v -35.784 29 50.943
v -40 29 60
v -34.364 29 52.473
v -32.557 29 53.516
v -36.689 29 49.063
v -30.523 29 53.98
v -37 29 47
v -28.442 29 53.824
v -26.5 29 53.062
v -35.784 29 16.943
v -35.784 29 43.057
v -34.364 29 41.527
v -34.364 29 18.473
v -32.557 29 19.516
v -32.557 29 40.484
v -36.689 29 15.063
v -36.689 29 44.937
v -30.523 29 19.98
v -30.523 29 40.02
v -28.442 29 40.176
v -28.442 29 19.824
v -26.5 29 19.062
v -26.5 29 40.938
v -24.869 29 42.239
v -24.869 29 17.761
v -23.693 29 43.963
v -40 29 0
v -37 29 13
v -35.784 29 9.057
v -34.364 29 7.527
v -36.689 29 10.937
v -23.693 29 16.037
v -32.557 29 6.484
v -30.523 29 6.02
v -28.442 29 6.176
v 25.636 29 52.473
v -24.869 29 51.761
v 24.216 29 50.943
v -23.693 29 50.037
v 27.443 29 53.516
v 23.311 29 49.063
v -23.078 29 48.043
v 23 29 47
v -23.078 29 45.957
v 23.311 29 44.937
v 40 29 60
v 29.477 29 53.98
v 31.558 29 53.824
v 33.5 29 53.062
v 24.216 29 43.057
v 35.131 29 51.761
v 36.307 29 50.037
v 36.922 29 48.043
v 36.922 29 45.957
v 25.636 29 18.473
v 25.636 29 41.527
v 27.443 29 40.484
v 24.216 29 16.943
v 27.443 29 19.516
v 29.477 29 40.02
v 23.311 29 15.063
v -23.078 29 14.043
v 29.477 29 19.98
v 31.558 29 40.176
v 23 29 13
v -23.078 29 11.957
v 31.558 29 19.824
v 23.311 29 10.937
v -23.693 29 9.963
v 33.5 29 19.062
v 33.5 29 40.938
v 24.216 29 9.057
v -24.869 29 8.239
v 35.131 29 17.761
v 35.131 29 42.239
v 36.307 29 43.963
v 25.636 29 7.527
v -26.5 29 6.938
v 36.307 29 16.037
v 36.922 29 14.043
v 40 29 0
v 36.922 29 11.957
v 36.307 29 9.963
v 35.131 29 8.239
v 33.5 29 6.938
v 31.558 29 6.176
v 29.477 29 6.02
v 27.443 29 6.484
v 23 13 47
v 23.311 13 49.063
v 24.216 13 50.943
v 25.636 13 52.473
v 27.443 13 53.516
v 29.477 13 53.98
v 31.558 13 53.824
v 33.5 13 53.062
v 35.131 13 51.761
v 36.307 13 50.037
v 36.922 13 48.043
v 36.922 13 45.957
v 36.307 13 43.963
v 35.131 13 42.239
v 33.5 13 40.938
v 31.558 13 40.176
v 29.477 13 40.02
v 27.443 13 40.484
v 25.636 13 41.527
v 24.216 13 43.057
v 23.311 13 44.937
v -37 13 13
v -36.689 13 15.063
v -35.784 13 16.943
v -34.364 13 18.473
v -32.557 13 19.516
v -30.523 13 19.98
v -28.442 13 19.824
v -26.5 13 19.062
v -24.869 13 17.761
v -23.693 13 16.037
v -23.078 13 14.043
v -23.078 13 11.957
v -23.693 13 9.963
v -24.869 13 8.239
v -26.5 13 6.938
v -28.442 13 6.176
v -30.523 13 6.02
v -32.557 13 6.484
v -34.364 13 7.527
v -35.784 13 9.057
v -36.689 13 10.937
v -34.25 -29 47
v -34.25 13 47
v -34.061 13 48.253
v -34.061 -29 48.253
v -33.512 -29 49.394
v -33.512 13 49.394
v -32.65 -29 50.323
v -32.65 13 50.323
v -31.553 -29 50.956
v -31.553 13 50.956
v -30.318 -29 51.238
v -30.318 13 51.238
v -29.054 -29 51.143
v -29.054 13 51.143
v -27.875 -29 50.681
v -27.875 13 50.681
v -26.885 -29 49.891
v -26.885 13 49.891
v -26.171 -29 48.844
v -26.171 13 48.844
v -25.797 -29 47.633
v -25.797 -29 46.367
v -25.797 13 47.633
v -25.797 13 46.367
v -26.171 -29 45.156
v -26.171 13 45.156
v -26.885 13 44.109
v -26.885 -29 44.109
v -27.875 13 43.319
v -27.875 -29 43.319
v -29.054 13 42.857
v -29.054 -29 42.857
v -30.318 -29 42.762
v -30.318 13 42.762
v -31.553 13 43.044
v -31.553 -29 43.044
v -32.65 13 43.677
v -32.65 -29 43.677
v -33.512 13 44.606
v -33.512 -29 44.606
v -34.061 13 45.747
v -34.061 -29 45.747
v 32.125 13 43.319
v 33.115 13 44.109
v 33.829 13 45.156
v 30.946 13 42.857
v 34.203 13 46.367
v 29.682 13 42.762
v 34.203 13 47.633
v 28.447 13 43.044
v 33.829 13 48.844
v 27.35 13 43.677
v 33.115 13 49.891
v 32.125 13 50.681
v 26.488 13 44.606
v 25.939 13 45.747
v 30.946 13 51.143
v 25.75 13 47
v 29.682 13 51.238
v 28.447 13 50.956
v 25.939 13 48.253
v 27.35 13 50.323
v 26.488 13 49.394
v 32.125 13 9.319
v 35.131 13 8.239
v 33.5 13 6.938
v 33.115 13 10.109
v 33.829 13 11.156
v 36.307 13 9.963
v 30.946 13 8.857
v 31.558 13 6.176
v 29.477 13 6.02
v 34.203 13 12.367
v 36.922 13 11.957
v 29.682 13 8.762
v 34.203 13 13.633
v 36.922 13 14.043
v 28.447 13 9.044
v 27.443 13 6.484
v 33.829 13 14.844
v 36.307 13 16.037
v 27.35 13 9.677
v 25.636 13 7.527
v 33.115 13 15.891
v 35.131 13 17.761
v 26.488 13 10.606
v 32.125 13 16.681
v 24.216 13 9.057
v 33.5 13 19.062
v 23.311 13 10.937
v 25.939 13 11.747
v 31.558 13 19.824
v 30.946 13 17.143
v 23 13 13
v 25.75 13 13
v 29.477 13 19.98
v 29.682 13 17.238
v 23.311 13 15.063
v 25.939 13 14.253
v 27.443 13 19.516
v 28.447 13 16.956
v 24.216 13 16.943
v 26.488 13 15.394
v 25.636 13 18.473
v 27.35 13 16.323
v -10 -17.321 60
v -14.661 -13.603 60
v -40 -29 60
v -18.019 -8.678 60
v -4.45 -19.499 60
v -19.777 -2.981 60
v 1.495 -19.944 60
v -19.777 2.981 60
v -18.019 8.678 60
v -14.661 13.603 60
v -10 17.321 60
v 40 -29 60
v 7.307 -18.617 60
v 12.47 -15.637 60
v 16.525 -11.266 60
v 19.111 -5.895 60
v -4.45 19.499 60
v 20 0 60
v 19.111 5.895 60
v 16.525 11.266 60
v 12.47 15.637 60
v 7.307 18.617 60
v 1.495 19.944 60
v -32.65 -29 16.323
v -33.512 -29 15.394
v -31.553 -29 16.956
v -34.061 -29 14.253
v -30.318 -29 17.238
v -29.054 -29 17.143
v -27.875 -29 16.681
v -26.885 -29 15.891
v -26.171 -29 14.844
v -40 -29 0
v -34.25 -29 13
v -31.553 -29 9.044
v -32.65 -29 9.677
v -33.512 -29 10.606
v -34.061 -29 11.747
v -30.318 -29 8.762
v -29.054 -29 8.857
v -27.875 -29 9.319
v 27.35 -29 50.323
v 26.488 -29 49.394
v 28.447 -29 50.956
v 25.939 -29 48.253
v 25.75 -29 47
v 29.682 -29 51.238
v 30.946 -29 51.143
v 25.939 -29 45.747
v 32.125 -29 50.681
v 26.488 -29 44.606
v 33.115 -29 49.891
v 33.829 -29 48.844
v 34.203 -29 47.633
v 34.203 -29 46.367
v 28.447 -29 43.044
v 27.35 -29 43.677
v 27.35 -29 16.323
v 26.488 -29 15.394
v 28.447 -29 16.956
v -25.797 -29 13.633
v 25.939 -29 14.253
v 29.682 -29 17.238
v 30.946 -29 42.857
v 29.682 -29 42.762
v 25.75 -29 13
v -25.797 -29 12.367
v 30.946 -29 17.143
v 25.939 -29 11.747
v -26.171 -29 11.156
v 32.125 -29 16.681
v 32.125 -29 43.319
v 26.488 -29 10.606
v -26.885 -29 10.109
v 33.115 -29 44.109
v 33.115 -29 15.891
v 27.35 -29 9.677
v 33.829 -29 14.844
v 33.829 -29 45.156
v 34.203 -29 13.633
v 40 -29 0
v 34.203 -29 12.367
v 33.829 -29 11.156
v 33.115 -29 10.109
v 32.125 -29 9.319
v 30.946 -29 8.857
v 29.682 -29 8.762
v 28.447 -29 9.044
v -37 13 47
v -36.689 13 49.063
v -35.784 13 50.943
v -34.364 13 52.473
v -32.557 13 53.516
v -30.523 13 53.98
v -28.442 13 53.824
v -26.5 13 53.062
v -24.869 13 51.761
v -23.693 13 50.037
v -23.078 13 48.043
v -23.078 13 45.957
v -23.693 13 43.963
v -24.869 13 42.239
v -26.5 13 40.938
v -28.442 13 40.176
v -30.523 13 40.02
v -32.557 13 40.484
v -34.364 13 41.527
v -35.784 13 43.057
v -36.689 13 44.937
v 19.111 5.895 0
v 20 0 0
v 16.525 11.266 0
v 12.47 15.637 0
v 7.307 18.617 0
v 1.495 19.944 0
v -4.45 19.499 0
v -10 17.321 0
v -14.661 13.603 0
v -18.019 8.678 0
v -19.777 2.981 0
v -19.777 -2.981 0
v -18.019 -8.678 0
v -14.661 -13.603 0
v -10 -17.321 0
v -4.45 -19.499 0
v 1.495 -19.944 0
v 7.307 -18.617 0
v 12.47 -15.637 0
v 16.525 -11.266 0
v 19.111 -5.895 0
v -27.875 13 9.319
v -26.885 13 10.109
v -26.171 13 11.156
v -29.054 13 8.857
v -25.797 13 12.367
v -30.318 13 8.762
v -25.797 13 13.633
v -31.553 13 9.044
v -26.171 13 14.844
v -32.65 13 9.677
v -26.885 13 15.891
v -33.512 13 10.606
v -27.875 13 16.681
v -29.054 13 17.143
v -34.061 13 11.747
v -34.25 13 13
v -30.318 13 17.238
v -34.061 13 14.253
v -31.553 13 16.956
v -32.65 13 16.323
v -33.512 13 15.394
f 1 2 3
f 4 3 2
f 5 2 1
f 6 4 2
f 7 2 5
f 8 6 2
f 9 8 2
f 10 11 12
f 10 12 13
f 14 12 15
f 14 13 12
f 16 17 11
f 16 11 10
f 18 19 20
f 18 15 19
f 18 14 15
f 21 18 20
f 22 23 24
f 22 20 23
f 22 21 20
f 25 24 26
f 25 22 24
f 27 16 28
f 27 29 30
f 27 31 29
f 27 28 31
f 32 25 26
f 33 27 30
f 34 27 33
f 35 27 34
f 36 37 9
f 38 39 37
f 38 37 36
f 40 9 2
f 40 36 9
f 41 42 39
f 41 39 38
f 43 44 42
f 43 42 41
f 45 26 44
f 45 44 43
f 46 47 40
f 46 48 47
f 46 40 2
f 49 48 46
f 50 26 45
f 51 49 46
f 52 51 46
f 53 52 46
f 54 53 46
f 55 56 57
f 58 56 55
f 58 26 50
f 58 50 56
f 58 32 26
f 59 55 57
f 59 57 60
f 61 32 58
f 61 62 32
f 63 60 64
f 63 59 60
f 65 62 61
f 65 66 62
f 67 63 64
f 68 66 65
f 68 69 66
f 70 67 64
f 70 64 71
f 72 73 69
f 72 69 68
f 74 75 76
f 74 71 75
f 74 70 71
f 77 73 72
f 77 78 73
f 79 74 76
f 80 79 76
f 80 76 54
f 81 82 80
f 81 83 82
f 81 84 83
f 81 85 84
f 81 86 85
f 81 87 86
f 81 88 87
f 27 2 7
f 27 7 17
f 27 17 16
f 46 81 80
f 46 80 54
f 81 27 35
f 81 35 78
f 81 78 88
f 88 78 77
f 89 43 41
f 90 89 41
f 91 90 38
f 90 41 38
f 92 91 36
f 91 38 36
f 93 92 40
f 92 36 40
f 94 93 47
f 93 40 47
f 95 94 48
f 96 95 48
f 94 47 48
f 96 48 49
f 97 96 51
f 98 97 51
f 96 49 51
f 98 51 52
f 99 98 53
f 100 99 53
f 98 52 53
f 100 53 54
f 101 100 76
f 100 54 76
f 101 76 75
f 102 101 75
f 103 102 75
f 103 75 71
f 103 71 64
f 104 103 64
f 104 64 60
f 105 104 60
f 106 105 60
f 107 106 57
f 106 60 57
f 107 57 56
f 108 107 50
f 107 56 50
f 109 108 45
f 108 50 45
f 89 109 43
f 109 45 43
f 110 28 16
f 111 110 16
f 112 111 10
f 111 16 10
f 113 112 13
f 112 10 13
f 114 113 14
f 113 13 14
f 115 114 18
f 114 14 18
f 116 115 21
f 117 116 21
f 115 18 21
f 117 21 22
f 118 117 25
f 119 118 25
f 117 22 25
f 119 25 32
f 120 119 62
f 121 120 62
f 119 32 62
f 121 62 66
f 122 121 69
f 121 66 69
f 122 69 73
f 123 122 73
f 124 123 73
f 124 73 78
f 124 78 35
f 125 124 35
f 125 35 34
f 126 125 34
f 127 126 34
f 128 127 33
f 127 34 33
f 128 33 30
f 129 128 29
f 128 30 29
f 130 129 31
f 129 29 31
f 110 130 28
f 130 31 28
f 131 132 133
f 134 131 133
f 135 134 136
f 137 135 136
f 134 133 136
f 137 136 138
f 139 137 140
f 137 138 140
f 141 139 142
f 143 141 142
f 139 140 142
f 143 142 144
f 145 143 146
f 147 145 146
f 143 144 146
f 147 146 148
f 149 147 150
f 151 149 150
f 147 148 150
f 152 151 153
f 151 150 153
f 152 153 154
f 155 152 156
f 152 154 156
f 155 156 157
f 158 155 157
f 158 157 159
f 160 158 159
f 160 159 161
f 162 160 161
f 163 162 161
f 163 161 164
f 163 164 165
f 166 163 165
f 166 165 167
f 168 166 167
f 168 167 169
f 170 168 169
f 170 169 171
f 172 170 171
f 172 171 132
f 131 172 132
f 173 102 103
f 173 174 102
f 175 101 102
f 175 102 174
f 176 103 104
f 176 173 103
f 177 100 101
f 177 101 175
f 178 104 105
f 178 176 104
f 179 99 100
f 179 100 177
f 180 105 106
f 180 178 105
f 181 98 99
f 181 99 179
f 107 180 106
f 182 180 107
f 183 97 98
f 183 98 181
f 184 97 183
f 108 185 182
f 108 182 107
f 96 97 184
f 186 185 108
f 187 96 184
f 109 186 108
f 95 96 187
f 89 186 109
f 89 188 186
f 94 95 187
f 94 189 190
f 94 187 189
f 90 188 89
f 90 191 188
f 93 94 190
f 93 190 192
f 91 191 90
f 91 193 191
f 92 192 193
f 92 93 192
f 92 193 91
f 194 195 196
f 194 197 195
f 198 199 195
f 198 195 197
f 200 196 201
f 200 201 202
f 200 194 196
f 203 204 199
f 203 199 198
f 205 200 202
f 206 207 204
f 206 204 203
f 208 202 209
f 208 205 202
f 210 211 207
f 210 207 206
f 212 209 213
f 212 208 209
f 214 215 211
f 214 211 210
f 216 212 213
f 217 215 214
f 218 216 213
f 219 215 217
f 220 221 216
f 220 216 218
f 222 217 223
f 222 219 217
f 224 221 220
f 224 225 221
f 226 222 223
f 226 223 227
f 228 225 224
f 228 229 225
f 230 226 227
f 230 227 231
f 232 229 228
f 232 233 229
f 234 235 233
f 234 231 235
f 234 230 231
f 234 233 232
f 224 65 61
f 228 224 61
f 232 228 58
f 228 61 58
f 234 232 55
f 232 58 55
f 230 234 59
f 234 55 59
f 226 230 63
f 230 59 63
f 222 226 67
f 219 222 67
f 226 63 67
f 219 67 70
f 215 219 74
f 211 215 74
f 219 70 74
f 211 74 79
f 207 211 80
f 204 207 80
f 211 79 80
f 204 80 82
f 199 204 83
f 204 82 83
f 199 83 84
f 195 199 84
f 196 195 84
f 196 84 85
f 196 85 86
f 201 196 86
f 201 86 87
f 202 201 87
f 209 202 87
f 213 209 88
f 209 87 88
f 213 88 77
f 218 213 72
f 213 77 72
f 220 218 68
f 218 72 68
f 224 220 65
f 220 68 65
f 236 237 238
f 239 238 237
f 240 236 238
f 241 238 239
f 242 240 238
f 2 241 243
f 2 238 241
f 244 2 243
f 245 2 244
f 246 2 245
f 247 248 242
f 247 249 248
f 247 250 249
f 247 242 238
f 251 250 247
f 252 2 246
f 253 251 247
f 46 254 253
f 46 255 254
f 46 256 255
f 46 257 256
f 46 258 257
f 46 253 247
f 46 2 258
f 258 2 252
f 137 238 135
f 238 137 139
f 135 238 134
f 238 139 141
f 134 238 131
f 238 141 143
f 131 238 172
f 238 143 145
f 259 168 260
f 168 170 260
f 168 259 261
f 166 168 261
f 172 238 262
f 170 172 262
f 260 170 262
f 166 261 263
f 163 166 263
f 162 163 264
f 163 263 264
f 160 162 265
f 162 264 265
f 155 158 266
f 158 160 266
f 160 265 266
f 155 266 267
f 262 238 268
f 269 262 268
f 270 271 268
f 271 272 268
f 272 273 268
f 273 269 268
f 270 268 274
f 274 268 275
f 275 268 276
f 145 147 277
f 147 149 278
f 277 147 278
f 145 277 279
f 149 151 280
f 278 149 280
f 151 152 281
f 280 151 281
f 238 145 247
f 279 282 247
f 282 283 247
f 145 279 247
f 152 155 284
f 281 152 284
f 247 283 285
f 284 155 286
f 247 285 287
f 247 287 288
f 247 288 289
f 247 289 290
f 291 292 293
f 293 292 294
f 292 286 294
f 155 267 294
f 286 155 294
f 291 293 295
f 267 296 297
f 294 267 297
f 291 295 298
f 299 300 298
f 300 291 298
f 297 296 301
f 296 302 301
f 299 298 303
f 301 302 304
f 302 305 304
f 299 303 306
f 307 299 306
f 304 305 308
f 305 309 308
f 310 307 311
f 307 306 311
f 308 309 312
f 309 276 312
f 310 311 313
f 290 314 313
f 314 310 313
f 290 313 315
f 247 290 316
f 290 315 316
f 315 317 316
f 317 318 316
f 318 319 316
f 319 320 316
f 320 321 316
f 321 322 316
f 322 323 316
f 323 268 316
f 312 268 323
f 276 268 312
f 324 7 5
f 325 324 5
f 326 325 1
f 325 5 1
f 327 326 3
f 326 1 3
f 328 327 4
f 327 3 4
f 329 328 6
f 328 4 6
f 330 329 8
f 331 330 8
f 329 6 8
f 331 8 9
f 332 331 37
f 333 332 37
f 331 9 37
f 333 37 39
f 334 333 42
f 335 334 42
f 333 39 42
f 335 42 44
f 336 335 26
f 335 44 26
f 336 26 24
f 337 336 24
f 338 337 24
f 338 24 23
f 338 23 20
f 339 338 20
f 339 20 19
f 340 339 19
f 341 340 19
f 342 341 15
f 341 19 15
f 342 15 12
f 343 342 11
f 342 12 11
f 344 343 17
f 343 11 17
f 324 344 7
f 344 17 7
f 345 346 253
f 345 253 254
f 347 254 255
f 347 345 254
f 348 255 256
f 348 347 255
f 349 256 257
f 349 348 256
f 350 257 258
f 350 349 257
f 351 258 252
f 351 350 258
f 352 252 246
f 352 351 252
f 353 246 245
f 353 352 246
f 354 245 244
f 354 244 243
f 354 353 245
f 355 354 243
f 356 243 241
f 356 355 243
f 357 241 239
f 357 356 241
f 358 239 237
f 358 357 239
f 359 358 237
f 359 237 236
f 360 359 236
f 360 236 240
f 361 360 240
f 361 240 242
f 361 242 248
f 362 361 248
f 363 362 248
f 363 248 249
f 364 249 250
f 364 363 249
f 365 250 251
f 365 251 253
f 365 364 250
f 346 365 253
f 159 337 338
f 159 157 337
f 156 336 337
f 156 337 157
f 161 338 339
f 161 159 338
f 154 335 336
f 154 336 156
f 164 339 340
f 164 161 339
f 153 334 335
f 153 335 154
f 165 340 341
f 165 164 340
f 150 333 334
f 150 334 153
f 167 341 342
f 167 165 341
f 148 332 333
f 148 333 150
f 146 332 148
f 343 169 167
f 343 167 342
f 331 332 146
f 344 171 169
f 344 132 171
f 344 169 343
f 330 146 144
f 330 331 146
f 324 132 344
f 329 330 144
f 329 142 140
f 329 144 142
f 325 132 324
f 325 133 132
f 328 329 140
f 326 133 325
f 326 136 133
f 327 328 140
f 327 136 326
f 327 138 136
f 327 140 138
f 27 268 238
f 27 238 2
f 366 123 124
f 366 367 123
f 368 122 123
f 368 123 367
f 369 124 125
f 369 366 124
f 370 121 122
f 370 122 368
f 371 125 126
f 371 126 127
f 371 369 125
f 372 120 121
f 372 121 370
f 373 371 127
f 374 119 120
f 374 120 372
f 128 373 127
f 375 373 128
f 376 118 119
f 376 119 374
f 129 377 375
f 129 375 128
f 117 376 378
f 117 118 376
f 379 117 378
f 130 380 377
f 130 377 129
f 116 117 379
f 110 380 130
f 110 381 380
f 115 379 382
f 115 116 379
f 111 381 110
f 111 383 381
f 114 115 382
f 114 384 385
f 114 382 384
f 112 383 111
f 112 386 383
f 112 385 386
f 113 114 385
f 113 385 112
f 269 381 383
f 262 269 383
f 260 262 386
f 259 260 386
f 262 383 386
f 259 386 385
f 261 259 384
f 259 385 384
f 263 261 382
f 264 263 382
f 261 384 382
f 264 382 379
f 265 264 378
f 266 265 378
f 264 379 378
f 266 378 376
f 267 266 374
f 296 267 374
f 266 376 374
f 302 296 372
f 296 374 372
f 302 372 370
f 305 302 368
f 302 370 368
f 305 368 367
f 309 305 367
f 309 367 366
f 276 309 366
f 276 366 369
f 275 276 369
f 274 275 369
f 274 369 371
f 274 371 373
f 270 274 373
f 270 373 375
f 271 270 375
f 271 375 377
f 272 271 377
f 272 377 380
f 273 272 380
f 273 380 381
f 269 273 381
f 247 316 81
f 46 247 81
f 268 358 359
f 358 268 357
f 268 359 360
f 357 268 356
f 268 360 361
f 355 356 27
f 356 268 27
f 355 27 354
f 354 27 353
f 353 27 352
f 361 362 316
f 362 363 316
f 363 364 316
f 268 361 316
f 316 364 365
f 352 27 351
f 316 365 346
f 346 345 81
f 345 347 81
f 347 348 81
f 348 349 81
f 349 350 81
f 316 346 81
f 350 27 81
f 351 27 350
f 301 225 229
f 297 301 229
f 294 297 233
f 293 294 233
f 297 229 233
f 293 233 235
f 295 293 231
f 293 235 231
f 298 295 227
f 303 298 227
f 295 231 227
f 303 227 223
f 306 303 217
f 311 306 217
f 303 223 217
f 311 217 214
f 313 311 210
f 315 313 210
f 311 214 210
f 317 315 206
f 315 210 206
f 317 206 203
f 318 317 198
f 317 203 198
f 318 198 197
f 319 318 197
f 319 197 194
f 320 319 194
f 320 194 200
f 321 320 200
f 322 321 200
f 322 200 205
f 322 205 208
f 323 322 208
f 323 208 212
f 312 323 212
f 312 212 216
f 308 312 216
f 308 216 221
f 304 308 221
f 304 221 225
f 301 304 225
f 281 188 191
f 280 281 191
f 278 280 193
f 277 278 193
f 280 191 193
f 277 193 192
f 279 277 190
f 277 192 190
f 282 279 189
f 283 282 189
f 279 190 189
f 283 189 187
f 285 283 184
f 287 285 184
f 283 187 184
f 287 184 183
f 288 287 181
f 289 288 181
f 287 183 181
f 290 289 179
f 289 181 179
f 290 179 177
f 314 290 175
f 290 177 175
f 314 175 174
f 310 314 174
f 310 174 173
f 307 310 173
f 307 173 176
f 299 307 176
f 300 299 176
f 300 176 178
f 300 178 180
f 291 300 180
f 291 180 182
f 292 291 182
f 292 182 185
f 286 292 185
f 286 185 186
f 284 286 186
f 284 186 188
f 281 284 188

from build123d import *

# Parameters (mm, degrees)
F0_W     = 80
F0_H     = 58
F0_R     = 20
F1_DEPTH = 60
F2_R     = 4.25
F3_DEPTH = 58.001
F2_R_2   = 7
F4_DEPTH = 16


with BuildPart() as f1:
    # F0 (on Top) → F1 (new body)
    with BuildSketch(Plane.XY):
        Rectangle(F0_W, F0_H)
        Circle(F0_R, mode=Mode.SUBTRACT)
    extrude(amount=F1_DEPTH)

    # F2 (on face) → F3 (cut, through all)
    with BuildSketch(Plane(origin=(0, 29, 0), x_dir=(-1, 0, 0), z_dir=(0, 1, 0))):
        with Locations((30, 13)):
            Circle(F2_R)
        with Locations((-30, 13)):
            Circle(F2_R)
        with Locations((-30, 47)):
            Circle(F2_R)
        with Locations((30, 47)):
            Circle(F2_R)
    extrude(amount=-F3_DEPTH, mode=Mode.SUBTRACT)

    # F2 (on face) → F4 (cut)
    with BuildSketch(Plane(origin=(0, 29, 0), x_dir=(-1, 0, 0), z_dir=(0, 1, 0))):
        with Locations((30, 13)):
            Circle(F2_R_2)
        with Locations((30, 13)):
            Circle(F2_R, mode=Mode.SUBTRACT)
        with Locations((-30, 13)):
            Circle(F2_R_2)
        with Locations((-30, 13)):
            Circle(F2_R, mode=Mode.SUBTRACT)
        with Locations((-30, 47)):
            Circle(F2_R_2)
        with Locations((-30, 47)):
            Circle(F2_R, mode=Mode.SUBTRACT)
        with Locations((30, 47)):
            Circle(F2_R_2)
        with Locations((30, 47)):
            Circle(F2_R, mode=Mode.SUBTRACT)
    extrude(amount=-F4_DEPTH, mode=Mode.SUBTRACT)


solid = f1.part
